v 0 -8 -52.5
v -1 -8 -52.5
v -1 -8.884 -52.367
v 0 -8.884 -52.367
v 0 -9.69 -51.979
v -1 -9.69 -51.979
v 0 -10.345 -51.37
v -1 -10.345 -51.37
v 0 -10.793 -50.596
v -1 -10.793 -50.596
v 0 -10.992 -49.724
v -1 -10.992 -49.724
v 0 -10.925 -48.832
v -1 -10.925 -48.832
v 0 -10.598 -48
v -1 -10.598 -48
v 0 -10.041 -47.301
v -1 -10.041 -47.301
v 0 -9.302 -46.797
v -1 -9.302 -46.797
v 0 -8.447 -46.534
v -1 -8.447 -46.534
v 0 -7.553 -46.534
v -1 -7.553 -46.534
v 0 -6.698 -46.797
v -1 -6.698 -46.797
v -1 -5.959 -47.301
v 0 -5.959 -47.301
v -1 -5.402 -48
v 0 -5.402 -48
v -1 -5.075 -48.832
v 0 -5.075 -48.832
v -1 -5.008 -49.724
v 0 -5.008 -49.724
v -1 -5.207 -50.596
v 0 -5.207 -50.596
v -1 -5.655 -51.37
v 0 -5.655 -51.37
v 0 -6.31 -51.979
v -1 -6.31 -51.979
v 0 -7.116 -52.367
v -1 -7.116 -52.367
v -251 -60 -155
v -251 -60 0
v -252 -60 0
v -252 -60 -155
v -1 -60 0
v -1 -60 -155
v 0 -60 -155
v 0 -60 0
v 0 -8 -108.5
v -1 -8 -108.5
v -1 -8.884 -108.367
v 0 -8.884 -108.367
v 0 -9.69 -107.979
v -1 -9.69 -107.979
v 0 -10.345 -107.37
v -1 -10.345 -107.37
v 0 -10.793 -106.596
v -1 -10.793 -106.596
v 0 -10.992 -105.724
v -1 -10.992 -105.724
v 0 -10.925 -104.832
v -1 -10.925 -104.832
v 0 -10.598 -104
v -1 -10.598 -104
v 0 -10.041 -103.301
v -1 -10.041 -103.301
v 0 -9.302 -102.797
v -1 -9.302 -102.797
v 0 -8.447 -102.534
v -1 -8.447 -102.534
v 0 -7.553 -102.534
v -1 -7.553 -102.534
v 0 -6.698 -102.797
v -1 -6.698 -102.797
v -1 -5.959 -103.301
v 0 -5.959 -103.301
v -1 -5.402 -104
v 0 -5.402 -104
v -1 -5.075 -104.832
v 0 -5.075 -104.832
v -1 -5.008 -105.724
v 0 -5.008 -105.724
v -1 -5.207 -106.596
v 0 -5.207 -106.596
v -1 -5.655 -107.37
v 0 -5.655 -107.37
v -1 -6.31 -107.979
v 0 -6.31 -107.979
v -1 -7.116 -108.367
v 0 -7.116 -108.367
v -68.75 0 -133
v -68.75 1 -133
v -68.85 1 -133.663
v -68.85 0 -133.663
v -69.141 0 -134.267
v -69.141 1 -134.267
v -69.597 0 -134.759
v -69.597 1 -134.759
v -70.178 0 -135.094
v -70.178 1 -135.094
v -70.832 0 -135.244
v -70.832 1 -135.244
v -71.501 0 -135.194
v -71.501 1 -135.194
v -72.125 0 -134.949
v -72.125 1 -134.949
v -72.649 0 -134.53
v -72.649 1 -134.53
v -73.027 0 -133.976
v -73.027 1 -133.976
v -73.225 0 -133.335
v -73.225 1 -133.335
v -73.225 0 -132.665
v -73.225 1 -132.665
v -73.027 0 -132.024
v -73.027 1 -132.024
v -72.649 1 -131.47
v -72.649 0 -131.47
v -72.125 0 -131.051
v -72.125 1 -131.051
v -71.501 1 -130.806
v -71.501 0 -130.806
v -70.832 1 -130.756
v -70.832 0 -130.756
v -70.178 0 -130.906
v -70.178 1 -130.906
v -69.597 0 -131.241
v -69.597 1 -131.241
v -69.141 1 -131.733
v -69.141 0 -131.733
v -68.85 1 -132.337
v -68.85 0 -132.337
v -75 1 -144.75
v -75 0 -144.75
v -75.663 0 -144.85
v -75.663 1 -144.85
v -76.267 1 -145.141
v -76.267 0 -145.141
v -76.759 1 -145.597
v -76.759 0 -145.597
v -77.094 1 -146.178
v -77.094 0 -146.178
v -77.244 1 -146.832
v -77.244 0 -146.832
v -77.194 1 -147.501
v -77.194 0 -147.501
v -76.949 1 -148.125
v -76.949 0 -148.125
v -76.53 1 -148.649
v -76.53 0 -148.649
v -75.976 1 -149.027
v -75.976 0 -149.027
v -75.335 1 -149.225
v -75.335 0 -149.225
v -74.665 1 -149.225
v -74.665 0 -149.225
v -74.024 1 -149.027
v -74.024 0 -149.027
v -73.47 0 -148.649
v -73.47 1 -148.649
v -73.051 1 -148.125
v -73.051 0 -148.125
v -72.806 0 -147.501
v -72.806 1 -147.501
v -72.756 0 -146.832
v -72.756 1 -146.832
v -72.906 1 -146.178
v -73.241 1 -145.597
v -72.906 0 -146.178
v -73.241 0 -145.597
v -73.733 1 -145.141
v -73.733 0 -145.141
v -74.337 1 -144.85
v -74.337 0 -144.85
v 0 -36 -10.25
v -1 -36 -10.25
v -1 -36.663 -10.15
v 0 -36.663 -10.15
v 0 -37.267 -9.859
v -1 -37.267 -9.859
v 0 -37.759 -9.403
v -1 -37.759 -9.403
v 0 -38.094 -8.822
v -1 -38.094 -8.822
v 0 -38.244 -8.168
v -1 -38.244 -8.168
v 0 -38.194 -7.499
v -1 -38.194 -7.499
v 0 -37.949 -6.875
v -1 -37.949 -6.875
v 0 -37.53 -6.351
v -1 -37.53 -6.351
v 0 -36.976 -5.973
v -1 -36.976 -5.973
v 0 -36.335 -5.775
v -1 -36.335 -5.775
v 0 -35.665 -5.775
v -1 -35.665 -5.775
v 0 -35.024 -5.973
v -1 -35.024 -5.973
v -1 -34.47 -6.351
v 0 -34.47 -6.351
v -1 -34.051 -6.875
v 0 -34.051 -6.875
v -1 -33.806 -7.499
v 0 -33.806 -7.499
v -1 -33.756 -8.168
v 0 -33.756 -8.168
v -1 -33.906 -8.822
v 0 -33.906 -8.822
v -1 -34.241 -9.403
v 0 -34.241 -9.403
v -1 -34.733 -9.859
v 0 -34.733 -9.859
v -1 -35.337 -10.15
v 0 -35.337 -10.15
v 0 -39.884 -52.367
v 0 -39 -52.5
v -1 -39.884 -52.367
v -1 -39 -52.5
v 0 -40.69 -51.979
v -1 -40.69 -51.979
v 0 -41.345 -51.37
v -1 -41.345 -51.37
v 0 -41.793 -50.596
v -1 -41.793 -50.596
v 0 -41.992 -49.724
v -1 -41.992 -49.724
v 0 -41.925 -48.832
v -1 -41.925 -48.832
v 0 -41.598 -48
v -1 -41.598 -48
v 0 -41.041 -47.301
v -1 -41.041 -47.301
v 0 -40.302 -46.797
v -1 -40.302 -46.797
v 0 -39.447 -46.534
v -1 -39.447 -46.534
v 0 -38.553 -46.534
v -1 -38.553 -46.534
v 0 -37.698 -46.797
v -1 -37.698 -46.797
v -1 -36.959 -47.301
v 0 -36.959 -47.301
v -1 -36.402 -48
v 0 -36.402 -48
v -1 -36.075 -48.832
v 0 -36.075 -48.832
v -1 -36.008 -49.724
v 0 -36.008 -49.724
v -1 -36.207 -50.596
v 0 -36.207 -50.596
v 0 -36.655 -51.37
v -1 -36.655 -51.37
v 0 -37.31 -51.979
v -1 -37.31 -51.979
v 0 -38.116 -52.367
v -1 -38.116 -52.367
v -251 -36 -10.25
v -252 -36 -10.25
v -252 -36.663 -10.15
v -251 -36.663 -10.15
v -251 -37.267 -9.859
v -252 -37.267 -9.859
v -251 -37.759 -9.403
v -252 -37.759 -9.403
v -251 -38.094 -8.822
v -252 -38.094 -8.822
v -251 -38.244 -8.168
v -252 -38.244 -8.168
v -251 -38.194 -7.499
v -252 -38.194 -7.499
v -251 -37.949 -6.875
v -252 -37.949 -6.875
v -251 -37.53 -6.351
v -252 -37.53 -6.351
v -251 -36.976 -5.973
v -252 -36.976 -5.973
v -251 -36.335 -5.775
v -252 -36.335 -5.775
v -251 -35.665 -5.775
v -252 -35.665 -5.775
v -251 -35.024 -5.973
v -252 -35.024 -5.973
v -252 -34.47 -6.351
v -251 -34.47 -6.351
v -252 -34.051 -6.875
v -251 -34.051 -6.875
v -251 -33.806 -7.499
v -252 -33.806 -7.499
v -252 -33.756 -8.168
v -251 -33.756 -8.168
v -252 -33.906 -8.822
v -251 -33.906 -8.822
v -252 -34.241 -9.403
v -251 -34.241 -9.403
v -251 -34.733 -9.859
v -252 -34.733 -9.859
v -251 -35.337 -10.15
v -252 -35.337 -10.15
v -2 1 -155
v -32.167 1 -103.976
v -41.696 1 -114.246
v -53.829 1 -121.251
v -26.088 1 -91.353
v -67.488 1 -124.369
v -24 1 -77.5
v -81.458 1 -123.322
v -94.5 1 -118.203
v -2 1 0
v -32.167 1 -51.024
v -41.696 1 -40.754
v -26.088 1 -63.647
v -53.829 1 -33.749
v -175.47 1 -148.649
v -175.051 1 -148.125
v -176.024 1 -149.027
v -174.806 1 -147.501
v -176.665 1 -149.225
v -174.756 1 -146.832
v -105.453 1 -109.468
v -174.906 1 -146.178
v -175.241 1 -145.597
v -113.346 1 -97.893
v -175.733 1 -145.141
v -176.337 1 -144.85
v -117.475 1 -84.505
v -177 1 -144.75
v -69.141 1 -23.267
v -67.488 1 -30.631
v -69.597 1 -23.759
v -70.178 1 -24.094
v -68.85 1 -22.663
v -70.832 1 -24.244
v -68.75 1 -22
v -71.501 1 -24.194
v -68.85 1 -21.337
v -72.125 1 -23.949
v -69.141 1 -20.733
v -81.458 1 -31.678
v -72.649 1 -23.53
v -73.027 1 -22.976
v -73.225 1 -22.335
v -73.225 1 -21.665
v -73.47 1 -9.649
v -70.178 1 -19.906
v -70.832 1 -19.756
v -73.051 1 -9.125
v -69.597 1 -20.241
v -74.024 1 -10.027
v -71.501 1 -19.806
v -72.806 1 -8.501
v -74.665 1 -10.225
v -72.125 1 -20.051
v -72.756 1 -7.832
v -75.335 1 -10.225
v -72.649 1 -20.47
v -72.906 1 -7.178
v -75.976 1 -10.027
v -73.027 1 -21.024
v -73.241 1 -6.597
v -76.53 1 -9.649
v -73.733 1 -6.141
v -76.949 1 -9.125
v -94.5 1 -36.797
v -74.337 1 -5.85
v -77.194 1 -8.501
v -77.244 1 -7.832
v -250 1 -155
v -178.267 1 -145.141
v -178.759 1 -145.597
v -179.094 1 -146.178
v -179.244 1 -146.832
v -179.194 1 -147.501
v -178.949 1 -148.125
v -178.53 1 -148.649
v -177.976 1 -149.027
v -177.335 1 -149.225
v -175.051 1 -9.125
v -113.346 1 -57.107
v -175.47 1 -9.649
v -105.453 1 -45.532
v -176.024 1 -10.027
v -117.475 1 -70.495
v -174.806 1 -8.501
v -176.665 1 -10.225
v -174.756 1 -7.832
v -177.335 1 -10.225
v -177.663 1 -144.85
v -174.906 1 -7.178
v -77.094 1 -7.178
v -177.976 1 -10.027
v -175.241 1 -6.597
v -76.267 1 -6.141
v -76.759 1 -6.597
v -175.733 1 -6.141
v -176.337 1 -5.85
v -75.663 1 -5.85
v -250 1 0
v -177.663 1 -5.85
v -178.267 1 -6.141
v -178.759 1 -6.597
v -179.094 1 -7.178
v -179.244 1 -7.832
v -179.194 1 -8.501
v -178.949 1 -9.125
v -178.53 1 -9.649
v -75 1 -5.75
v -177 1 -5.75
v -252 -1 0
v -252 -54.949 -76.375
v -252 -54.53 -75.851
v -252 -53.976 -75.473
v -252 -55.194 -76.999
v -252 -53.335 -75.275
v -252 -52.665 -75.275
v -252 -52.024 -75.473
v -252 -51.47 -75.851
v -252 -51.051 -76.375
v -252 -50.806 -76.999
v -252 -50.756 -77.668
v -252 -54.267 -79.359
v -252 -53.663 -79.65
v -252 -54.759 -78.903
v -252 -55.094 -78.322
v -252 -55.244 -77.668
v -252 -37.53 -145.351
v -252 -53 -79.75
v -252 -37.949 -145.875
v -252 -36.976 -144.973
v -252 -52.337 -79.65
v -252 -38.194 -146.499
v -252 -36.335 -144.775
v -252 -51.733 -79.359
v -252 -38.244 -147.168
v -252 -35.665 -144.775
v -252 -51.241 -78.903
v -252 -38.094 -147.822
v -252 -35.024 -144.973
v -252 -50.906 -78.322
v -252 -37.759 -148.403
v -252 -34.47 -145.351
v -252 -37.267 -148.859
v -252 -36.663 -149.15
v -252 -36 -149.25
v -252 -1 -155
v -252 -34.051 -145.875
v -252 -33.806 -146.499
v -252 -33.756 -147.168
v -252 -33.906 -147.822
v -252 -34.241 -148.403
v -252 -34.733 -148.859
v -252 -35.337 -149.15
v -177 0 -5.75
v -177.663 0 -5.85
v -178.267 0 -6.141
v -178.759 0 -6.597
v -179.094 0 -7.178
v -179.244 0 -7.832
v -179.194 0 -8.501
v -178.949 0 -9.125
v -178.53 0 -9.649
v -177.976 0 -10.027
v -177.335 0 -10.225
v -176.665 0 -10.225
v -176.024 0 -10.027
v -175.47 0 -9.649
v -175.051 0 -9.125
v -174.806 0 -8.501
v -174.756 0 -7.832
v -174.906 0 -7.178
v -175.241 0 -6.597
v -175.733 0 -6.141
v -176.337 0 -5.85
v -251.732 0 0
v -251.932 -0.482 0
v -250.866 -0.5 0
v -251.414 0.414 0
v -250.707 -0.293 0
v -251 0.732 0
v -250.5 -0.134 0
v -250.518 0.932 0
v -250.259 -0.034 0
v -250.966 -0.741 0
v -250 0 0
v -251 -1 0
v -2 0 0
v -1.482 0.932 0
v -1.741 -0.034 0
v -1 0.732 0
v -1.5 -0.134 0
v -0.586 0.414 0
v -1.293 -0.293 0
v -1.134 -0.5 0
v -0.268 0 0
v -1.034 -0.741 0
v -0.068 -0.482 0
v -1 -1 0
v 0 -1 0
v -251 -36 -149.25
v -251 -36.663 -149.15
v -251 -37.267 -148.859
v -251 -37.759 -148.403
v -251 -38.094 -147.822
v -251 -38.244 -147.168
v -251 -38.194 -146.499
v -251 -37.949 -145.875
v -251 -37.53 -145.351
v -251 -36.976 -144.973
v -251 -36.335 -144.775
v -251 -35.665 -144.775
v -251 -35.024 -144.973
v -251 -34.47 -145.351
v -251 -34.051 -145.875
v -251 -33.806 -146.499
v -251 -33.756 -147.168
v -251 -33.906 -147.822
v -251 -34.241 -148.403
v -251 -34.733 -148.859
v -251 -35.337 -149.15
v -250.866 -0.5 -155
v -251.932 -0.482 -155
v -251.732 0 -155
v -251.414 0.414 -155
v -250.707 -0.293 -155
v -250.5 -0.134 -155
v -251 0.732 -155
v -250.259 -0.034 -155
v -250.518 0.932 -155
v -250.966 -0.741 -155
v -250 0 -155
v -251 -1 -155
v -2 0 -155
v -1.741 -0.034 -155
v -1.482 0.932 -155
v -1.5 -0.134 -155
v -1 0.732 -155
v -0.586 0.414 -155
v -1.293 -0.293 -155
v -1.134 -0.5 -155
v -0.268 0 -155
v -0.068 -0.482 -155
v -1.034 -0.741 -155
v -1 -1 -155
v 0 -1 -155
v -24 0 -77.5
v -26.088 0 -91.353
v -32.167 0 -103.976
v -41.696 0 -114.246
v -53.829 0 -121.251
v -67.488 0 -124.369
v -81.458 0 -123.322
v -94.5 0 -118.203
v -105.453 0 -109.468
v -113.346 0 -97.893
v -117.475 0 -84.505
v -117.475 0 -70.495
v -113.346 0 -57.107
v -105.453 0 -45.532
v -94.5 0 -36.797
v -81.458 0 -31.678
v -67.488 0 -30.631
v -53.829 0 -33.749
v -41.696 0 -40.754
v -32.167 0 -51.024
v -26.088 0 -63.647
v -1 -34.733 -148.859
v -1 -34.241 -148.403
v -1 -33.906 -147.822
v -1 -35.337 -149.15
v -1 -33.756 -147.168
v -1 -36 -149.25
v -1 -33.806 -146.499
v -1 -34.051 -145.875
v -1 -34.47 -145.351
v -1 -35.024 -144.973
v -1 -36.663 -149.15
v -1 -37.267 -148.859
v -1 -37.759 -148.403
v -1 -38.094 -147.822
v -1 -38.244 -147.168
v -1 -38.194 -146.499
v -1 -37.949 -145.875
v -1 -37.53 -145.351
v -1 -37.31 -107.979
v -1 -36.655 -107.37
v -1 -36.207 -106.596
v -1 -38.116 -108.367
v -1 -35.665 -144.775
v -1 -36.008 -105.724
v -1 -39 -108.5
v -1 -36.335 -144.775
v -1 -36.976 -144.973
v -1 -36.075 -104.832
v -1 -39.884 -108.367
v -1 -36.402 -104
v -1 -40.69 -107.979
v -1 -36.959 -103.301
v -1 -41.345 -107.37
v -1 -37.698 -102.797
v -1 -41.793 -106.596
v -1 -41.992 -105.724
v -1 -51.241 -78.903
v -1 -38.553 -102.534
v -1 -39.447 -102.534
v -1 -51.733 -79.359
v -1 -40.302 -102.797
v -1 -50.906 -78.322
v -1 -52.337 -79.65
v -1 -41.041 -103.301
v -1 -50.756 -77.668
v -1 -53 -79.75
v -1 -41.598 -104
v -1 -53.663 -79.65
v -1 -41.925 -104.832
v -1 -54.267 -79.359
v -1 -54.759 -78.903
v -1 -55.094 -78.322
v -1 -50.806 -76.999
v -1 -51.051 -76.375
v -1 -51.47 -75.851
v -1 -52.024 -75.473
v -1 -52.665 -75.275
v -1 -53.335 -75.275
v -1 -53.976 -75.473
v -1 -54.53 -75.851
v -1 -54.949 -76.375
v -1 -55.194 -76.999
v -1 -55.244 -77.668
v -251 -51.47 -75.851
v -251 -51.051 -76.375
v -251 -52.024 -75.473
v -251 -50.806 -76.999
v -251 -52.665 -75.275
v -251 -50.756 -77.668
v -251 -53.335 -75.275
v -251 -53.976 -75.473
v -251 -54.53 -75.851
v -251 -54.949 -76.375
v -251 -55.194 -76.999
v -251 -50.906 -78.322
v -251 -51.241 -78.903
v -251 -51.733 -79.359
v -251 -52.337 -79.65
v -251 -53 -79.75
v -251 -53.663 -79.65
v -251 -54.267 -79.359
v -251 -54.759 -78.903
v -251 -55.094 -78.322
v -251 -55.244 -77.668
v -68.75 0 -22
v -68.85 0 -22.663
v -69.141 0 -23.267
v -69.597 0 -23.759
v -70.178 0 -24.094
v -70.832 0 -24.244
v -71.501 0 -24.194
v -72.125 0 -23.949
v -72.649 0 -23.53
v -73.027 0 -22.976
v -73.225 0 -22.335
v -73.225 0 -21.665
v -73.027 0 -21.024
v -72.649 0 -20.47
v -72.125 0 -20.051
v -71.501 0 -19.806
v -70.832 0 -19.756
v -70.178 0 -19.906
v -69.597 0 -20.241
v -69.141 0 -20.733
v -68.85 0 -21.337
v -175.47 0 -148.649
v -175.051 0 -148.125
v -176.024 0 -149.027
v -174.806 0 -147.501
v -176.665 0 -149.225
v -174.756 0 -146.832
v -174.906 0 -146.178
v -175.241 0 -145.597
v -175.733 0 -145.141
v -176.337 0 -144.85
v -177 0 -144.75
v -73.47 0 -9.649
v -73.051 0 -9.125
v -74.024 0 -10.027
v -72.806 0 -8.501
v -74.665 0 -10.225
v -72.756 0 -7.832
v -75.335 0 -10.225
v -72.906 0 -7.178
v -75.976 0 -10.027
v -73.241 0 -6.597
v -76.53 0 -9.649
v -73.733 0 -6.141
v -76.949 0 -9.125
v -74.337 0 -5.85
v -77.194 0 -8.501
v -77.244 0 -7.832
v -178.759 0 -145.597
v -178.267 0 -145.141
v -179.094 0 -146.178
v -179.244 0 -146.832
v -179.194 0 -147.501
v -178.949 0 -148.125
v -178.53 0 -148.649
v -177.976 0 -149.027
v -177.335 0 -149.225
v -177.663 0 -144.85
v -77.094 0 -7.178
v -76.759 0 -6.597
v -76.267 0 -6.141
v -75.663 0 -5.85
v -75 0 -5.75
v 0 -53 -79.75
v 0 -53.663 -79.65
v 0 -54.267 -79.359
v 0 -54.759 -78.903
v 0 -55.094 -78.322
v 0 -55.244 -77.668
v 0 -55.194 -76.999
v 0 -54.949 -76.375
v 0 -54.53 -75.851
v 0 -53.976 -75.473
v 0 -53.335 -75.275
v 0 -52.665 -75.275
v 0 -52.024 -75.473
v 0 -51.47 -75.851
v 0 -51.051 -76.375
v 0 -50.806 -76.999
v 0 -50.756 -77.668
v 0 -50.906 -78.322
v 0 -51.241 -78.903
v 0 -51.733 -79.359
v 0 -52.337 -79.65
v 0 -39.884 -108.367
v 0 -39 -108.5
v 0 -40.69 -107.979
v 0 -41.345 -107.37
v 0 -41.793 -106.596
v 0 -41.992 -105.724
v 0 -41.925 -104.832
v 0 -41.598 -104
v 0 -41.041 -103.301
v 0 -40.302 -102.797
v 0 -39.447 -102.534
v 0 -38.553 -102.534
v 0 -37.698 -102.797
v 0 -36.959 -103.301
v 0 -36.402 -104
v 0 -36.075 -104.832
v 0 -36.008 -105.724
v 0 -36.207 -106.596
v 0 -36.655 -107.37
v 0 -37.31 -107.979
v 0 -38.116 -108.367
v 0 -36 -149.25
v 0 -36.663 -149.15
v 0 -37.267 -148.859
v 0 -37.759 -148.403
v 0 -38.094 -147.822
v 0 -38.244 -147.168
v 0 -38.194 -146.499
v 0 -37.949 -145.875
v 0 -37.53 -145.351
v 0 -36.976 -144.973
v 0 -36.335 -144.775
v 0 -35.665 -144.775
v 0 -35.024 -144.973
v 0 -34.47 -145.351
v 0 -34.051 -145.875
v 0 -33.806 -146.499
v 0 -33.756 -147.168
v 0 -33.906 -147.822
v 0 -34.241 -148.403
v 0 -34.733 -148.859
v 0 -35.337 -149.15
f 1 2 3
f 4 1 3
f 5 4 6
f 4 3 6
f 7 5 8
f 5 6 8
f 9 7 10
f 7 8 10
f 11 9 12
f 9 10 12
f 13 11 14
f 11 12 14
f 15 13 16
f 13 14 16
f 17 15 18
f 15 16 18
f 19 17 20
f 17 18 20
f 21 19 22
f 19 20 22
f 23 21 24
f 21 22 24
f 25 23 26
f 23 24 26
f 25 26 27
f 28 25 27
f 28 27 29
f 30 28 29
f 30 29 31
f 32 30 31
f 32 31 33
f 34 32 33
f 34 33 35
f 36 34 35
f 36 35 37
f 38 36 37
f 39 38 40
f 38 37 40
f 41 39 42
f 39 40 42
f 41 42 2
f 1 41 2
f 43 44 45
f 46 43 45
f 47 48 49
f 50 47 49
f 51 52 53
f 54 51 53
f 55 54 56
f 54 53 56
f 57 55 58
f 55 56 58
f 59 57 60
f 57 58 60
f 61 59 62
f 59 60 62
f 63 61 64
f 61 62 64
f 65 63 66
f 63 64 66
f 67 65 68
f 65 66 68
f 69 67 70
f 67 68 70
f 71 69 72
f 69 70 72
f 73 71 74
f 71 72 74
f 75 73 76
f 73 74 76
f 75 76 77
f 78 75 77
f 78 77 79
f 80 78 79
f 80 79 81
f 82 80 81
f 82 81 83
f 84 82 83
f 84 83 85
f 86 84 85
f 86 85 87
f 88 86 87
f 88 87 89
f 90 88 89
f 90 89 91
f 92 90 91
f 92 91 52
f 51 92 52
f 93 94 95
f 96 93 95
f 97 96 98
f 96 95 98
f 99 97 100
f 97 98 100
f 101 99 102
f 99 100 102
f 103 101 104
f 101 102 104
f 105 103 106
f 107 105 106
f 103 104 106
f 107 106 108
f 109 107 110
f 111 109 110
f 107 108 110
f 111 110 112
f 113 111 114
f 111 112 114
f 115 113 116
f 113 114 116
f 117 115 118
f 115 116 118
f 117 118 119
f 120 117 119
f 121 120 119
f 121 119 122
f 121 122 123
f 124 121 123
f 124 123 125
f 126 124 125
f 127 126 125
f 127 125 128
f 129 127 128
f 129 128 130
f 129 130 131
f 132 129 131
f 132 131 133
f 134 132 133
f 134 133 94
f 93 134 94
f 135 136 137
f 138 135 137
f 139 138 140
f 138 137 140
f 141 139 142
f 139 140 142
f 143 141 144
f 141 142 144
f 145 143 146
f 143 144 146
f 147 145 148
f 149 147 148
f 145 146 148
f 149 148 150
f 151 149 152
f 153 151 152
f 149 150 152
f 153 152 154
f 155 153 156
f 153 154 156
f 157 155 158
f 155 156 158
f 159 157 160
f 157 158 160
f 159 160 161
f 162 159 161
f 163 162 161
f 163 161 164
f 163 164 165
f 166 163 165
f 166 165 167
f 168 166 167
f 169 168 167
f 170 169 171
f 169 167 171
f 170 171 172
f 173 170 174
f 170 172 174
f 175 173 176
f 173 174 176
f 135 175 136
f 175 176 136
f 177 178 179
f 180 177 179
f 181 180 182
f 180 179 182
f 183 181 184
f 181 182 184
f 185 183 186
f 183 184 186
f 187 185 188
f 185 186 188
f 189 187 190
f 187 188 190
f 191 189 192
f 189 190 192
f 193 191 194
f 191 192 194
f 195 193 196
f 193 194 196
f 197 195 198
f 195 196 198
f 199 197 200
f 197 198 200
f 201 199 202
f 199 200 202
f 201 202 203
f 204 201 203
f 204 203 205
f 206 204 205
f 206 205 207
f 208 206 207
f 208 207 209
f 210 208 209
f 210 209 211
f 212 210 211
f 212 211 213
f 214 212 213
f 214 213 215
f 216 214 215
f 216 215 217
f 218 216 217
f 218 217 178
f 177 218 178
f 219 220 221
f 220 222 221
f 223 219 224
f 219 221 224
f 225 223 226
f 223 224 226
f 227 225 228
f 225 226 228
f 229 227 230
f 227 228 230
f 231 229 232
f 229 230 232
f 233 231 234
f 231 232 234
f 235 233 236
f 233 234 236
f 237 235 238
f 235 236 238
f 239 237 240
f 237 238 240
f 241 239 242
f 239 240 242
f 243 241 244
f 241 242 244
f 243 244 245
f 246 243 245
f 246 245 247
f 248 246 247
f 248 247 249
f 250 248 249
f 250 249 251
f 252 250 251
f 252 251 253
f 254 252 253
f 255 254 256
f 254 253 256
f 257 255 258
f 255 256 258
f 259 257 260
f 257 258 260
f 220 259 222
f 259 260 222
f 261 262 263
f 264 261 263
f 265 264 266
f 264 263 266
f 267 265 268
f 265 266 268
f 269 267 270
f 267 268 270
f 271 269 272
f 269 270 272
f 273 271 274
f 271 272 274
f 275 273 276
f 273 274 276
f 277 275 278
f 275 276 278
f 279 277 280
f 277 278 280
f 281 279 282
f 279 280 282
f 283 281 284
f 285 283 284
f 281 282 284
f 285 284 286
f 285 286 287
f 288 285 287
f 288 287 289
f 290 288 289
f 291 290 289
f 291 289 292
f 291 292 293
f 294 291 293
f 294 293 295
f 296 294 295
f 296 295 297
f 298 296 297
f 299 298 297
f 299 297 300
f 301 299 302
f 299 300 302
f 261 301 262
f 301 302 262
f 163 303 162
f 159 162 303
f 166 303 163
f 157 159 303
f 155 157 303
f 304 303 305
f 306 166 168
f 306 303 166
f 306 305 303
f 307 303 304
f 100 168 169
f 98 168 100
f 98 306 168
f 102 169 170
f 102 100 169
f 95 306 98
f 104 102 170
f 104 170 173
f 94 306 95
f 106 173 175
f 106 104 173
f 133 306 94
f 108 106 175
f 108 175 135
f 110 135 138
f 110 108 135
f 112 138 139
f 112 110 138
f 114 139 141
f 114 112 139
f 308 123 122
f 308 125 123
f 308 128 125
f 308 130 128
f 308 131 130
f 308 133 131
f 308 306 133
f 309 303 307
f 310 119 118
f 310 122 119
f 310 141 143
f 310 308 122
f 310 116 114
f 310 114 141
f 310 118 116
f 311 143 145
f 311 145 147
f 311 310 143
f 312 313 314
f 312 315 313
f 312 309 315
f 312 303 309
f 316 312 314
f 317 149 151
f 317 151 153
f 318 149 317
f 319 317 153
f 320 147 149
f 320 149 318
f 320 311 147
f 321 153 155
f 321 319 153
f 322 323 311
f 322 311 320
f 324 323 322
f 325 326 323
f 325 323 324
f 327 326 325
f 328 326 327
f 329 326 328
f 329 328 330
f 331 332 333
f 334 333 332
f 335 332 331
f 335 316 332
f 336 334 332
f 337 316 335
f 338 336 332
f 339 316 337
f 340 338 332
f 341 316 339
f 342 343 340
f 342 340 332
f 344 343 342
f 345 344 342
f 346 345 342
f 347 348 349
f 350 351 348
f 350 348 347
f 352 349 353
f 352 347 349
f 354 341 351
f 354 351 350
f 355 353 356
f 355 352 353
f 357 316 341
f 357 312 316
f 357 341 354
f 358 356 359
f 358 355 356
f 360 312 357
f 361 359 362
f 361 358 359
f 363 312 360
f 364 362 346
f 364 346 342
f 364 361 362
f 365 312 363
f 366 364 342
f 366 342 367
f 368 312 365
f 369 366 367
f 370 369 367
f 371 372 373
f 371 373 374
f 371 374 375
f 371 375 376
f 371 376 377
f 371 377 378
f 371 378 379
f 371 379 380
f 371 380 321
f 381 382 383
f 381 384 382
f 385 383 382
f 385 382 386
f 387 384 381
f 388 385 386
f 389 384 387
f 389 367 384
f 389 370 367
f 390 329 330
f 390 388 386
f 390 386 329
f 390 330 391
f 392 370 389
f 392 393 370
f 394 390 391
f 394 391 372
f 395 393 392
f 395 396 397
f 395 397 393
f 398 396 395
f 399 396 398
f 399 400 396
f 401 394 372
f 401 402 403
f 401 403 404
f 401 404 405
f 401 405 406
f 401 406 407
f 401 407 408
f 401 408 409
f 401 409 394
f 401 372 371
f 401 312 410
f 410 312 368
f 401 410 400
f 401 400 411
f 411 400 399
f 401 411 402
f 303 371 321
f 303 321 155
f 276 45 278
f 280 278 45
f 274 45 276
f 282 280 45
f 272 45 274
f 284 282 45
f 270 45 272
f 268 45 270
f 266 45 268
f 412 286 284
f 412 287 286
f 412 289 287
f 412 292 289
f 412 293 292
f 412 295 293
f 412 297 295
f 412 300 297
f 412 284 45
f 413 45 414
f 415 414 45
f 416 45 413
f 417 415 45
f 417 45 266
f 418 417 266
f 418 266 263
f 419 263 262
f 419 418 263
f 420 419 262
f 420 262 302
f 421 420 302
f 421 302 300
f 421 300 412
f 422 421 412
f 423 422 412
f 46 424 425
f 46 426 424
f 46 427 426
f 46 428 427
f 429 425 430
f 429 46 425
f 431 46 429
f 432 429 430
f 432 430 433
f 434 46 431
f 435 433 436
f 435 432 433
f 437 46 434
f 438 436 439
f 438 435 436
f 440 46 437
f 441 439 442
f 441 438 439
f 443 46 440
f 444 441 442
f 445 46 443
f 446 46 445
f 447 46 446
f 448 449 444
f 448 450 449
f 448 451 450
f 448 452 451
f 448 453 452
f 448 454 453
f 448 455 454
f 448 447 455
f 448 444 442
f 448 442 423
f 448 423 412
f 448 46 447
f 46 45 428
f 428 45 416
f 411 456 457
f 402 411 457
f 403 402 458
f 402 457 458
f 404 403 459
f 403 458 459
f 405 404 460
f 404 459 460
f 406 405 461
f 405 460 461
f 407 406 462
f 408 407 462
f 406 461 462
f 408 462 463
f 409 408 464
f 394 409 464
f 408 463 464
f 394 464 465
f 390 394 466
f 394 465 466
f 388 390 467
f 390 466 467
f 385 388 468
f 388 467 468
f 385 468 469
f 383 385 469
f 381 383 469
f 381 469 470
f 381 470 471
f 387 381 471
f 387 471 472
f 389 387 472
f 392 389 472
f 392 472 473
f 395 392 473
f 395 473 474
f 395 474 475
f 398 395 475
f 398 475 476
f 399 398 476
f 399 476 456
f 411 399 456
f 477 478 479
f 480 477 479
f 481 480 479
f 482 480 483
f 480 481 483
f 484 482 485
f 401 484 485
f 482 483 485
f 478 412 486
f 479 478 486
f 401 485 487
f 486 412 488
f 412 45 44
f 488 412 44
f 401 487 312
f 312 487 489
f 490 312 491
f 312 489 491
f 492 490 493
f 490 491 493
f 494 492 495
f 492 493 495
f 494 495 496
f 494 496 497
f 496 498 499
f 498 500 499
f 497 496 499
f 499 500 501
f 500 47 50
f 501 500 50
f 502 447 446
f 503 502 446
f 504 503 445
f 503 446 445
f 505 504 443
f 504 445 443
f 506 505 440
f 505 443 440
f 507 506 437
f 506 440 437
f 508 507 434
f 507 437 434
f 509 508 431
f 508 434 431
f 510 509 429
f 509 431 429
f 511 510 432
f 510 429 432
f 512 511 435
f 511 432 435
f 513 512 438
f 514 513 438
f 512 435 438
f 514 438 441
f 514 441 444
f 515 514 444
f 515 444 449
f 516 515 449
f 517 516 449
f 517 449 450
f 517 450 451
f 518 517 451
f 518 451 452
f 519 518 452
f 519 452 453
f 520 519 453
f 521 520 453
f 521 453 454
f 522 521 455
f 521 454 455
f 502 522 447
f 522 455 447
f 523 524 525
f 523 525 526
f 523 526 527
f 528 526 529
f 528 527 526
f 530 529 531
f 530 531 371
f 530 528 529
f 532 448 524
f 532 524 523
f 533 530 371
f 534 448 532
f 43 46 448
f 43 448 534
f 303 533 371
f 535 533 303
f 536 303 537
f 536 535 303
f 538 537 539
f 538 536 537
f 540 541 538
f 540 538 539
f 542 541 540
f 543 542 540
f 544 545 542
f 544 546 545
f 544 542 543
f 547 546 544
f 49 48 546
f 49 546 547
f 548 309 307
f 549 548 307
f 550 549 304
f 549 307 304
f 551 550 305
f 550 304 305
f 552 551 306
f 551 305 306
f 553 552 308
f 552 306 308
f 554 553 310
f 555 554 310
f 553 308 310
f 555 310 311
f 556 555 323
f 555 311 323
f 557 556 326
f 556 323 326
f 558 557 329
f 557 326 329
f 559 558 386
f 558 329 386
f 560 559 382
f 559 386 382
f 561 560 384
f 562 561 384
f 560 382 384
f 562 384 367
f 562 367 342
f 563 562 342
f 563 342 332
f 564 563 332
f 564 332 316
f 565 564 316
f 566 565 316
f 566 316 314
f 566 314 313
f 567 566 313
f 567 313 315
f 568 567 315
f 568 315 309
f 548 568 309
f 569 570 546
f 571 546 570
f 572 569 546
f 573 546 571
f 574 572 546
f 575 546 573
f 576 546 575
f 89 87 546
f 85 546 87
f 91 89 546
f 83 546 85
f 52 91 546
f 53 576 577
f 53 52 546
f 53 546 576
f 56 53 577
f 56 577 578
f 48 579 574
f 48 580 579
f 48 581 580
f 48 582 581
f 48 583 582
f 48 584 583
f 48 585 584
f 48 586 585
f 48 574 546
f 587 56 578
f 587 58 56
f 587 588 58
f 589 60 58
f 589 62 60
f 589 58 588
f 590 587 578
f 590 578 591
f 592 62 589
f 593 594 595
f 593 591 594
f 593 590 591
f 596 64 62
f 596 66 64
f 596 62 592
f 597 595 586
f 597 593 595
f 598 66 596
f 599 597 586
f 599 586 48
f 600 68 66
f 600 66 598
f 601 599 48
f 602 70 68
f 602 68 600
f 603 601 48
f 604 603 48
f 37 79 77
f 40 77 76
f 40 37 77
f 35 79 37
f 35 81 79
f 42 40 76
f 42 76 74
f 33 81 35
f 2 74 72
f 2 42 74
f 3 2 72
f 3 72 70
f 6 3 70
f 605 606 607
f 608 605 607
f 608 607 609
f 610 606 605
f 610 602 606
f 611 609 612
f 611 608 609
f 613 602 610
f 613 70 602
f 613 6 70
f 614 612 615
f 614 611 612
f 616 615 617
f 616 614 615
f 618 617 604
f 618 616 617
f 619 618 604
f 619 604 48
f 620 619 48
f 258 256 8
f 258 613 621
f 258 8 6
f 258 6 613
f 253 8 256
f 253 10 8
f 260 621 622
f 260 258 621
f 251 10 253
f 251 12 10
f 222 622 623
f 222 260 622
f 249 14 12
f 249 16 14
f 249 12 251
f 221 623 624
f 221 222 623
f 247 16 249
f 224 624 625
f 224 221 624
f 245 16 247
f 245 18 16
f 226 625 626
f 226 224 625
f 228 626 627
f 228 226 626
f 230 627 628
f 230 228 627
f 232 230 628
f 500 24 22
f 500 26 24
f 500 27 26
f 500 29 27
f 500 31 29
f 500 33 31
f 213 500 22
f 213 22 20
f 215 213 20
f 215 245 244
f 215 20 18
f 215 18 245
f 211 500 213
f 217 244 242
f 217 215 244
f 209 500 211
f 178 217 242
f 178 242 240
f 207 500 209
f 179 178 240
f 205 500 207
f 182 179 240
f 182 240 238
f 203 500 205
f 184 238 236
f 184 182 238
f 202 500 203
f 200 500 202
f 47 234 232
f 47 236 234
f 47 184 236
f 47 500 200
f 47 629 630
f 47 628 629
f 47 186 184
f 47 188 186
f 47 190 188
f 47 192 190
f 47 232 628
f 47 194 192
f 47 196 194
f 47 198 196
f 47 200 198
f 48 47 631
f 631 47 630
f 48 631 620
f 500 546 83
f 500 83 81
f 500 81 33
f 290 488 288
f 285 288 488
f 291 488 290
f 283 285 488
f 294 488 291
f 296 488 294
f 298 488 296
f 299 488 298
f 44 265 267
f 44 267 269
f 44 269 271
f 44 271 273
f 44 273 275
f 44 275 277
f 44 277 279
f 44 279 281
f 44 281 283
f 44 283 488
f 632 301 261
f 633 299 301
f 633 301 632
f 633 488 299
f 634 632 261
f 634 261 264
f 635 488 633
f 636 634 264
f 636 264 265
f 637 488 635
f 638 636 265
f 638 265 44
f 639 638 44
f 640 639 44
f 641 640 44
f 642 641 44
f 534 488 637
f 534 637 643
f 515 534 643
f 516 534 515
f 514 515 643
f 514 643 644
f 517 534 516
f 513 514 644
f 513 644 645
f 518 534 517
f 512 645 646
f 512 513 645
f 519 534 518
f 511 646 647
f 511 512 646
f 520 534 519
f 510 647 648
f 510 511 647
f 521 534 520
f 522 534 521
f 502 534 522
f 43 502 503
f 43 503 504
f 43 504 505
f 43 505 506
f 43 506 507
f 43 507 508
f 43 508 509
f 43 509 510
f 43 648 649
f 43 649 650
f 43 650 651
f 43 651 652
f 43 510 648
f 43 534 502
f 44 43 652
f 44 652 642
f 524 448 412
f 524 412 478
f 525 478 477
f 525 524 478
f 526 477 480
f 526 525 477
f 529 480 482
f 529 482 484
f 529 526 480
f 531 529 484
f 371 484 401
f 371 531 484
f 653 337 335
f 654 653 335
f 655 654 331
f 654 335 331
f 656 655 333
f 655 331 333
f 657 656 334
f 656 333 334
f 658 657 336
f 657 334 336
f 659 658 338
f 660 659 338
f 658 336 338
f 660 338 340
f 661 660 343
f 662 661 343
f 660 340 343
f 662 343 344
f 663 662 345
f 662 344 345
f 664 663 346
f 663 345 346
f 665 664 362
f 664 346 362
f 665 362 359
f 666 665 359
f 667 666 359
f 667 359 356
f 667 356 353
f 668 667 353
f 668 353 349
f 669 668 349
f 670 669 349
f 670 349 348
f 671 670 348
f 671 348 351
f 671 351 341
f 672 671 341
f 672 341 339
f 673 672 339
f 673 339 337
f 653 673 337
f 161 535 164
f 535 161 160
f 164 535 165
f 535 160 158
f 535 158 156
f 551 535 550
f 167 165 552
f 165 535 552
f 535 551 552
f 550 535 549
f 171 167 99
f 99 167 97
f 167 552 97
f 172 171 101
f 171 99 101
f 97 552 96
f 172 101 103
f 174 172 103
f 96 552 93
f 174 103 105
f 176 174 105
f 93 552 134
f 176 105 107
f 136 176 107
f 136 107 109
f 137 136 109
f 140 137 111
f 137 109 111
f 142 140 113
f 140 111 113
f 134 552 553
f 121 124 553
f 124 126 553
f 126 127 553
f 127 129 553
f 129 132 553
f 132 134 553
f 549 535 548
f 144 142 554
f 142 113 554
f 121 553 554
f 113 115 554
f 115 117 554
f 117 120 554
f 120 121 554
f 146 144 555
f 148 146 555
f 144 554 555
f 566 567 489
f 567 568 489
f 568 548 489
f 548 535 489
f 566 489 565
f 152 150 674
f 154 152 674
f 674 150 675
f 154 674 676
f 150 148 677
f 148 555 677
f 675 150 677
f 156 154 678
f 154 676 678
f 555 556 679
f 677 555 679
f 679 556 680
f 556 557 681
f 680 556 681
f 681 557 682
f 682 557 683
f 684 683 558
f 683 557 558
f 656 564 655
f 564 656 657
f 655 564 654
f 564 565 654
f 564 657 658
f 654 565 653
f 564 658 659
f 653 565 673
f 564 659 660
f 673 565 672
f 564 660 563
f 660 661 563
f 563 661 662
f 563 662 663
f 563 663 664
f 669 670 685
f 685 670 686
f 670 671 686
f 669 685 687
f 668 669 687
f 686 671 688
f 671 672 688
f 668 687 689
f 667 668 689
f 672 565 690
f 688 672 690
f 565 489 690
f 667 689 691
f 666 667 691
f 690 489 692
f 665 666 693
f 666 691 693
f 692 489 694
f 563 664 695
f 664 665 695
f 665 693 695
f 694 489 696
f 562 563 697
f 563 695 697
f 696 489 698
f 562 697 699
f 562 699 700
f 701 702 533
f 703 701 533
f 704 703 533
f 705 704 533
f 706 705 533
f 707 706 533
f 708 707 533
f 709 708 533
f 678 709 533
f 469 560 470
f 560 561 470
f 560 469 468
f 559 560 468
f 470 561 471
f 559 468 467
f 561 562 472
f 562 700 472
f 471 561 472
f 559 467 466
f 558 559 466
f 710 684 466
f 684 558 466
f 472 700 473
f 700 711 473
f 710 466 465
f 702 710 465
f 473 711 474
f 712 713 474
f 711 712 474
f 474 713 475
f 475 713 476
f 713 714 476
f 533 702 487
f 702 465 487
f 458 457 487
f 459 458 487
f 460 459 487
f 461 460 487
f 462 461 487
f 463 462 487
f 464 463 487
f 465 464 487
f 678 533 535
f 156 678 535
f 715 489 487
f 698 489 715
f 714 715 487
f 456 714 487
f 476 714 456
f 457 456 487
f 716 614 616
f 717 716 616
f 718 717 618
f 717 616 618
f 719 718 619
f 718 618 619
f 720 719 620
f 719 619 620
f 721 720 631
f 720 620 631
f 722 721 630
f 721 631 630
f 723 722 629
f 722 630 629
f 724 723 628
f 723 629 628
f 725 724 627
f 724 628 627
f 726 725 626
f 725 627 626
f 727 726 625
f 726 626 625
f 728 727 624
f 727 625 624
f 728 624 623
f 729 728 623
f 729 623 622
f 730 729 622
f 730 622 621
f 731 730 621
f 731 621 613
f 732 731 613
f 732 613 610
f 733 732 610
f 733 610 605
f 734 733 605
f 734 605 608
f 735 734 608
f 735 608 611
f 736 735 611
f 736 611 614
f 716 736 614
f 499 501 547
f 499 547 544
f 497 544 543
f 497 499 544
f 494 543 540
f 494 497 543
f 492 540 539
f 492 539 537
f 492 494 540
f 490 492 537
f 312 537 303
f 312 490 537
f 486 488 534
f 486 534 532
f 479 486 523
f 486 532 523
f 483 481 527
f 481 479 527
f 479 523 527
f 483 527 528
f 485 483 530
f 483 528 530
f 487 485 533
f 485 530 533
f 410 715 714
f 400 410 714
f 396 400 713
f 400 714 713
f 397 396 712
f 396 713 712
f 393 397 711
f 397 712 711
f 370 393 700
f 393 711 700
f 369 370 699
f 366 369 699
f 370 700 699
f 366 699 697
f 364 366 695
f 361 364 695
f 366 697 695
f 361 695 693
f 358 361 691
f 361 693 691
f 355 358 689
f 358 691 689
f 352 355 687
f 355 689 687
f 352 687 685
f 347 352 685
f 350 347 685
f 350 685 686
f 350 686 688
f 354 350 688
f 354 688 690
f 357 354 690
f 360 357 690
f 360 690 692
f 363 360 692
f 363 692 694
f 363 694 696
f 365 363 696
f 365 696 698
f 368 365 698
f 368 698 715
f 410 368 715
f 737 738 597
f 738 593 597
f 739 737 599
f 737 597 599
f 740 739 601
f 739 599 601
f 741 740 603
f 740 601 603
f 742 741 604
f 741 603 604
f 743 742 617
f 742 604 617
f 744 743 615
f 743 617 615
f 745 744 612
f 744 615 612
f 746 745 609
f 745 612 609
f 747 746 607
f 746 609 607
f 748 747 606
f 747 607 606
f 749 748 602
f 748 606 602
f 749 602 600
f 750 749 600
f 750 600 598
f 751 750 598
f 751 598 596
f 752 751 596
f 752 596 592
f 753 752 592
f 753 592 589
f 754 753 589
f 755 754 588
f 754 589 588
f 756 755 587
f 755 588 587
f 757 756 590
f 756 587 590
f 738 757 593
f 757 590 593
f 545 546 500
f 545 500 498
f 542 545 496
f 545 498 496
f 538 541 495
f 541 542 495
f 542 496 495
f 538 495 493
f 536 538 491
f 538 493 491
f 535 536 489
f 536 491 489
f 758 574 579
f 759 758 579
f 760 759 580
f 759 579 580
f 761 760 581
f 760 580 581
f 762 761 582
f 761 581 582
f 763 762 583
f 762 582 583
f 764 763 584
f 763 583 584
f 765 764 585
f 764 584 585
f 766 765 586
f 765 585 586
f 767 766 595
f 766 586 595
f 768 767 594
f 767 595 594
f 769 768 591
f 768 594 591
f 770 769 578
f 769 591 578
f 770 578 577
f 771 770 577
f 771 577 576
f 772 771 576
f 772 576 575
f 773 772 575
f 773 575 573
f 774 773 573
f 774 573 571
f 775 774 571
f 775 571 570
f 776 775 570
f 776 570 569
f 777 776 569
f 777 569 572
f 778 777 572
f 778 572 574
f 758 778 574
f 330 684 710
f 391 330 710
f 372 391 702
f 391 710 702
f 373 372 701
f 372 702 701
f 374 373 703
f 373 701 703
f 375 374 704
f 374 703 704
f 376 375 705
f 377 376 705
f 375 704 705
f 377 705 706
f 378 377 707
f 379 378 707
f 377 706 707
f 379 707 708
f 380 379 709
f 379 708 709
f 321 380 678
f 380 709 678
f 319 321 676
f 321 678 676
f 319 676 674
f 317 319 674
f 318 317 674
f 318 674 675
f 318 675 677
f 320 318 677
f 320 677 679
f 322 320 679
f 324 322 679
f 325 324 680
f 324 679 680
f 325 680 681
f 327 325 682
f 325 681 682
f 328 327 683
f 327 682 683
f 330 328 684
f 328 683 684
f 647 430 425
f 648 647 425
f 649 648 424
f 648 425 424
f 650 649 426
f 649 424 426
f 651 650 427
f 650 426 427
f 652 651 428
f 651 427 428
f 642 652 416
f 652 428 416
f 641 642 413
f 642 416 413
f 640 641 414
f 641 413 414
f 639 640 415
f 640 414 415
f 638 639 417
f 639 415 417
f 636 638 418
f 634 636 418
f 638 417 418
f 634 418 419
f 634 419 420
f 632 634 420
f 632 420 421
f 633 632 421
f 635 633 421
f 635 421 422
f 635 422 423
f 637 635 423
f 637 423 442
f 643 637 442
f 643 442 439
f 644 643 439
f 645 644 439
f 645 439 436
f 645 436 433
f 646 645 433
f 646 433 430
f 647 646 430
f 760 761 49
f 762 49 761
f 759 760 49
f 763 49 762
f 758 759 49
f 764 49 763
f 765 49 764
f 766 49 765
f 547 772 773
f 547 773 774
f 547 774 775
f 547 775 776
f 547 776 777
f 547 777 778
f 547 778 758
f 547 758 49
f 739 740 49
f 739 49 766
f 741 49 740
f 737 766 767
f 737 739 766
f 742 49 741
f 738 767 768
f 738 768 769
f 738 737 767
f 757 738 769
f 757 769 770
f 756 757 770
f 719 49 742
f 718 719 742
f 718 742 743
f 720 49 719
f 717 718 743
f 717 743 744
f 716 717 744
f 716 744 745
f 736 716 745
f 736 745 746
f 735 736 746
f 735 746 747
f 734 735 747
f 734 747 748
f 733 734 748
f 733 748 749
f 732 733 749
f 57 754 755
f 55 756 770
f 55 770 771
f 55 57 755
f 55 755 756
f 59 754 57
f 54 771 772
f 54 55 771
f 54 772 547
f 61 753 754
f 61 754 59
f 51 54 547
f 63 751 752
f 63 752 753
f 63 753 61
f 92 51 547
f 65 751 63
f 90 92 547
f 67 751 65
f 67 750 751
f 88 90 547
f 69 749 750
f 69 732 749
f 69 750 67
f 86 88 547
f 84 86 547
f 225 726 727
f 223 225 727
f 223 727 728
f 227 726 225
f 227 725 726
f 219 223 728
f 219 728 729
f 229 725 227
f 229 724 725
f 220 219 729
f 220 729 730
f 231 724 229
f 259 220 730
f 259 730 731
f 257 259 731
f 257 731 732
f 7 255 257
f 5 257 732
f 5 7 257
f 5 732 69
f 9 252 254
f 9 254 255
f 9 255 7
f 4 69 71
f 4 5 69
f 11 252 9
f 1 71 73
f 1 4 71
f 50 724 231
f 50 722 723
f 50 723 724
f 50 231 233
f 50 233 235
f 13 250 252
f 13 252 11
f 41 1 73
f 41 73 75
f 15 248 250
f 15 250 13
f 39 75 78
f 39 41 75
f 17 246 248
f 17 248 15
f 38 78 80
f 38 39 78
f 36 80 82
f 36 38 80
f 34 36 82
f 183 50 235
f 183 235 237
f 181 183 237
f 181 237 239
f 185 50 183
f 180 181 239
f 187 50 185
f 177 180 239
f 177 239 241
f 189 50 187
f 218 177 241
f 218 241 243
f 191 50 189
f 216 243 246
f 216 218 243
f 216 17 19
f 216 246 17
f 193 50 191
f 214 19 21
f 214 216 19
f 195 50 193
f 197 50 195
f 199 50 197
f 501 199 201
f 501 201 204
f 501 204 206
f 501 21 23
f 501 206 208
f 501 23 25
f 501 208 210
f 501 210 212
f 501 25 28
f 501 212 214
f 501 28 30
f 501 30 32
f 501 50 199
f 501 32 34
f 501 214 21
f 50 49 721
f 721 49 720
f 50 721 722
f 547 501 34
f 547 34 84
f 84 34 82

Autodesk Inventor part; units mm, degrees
ref_plane "YZ Plane" through (0, 0, 0) normal (1, 0, 0) x (0, 1, 0)
ref_plane "XZ Plane" through (0, 0, 0) normal (0, 1, 0) x (-1, 0, 0)
ref_plane "XY Plane" through (0, 0, 0) normal (0, 0, 1) x (1, 0, 0)
sketch "Sketch1" plane through (0, 0, 0) normal (0, 1, 0) x (-1, 0, 0)
  line L0 (0, 0) -> (252, 0)
  line L1 (252, 0) -> (252, -155)
  line L2 (252, -155) -> (0, -155)
  line L3 (0, -155) -> (0, 0)
  dimension "d0" = 252
  dimension "d1" = 155
extrude "Plate1" add sketch "Sketch1" along normal blind 1
sketch "Sketch2" plane through (-1, 1, 0) normal (1, 0, 0) x (0, 1, 0)
  line L0 (0, -155) -> (0, 0)
  line L1 (0, 0) -> (-61, 0)
  line L2 (-61, 0) -> (-61, -155)
  line L3 (-61, -155) -> (0, -155)
edge flange "Flange1" height 61 angle 90 thickness 1 bend radius 1 thickness toward (1, 0, 0) relief tear relief width 1 relief depth 0.5 edges at (0, 0, -77.5) wall of the first edge with corners at (-1, 1, -155) (-1, 1, 0) (-1, -60, 0) (-1, -60, -155)
bend "Bend1"
corner "Corner1"
sketch "Sketch3" plane through (-251, 1, -155) normal (-1, 0, 0) x (0, -1, 0)
  line L0 (0, 155) -> (0, 0)
  line L1 (0, 0) -> (61, 0)
  line L2 (61, 0) -> (61, 155)
  line L3 (61, 155) -> (0, 155)
edge flange "Flange2" height 61 angle 90 thickness 1 bend radius 1 thickness toward (-1, 0, 0) relief tear relief width 1 relief depth 0.5 edges at (-252, 0, -77.5) wall of the first edge with corners at (-251, 1, 0) (-251, 1, -155) (-251, -60, -155) (-251, -60, 0)
bend "Bend2"
corner "Corner2"
sketch "Sketch4" plane through (0, 1, 0) normal (0, 1, 0) x (1, 0, 0)
  line L0 (0, 155) -> (0, 0) projected
  line L1 (0, 0) -> (0, 77.5)
  line L2 (0, 77.5) -> (-71, 77.5)
  circle A0 centre (-71, 77.5) radius 47
  line L3 (-71, 77.5) -> (-71, 133) construction
  line L4 (-71, 77.5) -> (-71, 22) construction
  circle A1 centre (-71, 133) radius 2.25
  circle A2 centre (-71, 22) radius 2.25
  dimension "d23" = 77.5
  dimension "d24" = 71
  dimension "d25" = 94
  dimension "d26" = 55.5
  dimension "d27" = 55.5
  dimension "d28" = 4.5
  dimension "d29" = 4.5
extrude "Extrusion1" cut sketch "Sketch4" against normal through all
sketch "Sketch5" plane through (0, 1, 0) normal (0, 1, 0) x (1, 0, 0)
  line L0 (-252, 0) -> (-252, 155) projected
  line L1 (0, 155) -> (0, 0) projected
  line L2 (-250, 155) -> (-2, 155) projected
  line L3 (-2, 0) -> (-250, 0) projected
  point P0 (-177, 147)
  point P1 (-75, 147)
  point P2 (-177, 8)
  point P3 (-75, 8)
  dimension "d32" = 75
  dimension "d33" = 75
  dimension "d34" = 8
  dimension "d35" = 8
hole "Hole1" at (-177, 1, -147) at (-75, 1, -147) at (-177, 1, -8) at (-75, 1, -8) direction (0, -1, 0) diameter 4.5 end through all
sketch "Sketch6" plane through (0, -60, 0) normal (1, 0, 0) x (0, 0, -1)
  line L0 (0, 0) -> (0, 59) projected
  line L1 (155, 0) -> (0, 0) projected
  line L2 (155, 59) -> (155, 0) projected
  point P0 (0, 60)
  point P1 (8, 24)
  point P2 (77.5, 7)
  point P3 (147, 24)
  dimension "d43" = 77.5
  dimension "d44" = 7
  dimension "d45" = 8
  dimension "d46" = 8
  dimension "d47" = 24
  dimension "d48" = 24
hole "Hole2" at (0, -36, -8) at (0, -53, -77.5) at (0, -36, -147) direction (-1, 0, 0) diameter 4.5 end through all
sketch "Sketch7" plane through (0, -60, 0) normal (1, 0, 0) x (0, 0, -1)
  line L0 (155, 60) -> (0, 60) projected
  line L1 (0, 59) -> (155, 59) projected
  line L2 (77.5, 59) -> (42.5, 59)
  line L3 (42.5, 59) -> (42.5, 14)
  line L4 (42.5, 14) -> (112.5, 14)
  line L5 (112.5, 14) -> (112.5, 59)
  point P0 (49.5, 52)
  point P1 (49.5, 21)
  point P2 (105.5, 21)
  point P3 (105.5, 52)
  dimension "d57" = 35
  dimension "d58" = 45
  dimension "d59" = 70
  dimension "d60" = 7
  dimension "d61" = 7
  dimension "d62" = 7
  dimension "d63" = 7
hole "Hole3" at (0, -8, -49.5) at (0, -39, -49.5) at (0, -39, -105.5) at (0, -8, -105.5) direction (-1, 0, 0) diameter 6 depth 1
equation "\"d33\" = d32"
equation "\"d34\" = d35"
equation "\"d41\" = Thickness"
equation "\"d46\" = d45"
equation "\"d48\" = d47"
equation "\"d54\" = Thickness"
equation "\"d61\" = d60"
equation "\"d63\" = d62"
equation "\"d69\" = Thickness"
equation "\"d2\" = Thickness"
equation "\"d3\" = BendReliefWidth"
equation "\"d4\" = BendReliefDepth"
equation "\"d5\" = MinimumRemnant"
equation "\"d6\" = TransitionRadius"
equation "\"d9\" = BendRadius"
equation "\"d10\" = CornerReliefSize"
equation "\"d11\" = GapSize"
equation "\"d12\" = JacobiRadiusSize"
equation "\"d13\" = BendReliefWidth"
equation "\"d14\" = BendReliefDepth"
equation "\"d15\" = MinimumRemnant"
equation "\"d16\" = TransitionRadius"
equation "\"d19\" = BendRadius"
equation "\"d20\" = CornerReliefSize"
equation "\"d21\" = GapSize"
equation "\"d22\" = JacobiRadiusSize"
equation "\"BendRadius\" = Thickness"
equation "\"BendReliefWidth\" = Thickness"
equation "\"BendReliefDepth\" = 0.5 * Thickness"
equation "\"CornerReliefSize\" = 4 * Thickness"
equation "\"MinimumRemnant\" = 2 * Thickness"
equation "\"TransitionRadius\" = BendRadius"
equation "\"JacobiRadiusSize\" = BendRadius"
equation "\"GapSize\" = Thickness"
equation "\"Thickness\" = 1"
properties part number "tapa_v7" material "Steel, Carbon"
